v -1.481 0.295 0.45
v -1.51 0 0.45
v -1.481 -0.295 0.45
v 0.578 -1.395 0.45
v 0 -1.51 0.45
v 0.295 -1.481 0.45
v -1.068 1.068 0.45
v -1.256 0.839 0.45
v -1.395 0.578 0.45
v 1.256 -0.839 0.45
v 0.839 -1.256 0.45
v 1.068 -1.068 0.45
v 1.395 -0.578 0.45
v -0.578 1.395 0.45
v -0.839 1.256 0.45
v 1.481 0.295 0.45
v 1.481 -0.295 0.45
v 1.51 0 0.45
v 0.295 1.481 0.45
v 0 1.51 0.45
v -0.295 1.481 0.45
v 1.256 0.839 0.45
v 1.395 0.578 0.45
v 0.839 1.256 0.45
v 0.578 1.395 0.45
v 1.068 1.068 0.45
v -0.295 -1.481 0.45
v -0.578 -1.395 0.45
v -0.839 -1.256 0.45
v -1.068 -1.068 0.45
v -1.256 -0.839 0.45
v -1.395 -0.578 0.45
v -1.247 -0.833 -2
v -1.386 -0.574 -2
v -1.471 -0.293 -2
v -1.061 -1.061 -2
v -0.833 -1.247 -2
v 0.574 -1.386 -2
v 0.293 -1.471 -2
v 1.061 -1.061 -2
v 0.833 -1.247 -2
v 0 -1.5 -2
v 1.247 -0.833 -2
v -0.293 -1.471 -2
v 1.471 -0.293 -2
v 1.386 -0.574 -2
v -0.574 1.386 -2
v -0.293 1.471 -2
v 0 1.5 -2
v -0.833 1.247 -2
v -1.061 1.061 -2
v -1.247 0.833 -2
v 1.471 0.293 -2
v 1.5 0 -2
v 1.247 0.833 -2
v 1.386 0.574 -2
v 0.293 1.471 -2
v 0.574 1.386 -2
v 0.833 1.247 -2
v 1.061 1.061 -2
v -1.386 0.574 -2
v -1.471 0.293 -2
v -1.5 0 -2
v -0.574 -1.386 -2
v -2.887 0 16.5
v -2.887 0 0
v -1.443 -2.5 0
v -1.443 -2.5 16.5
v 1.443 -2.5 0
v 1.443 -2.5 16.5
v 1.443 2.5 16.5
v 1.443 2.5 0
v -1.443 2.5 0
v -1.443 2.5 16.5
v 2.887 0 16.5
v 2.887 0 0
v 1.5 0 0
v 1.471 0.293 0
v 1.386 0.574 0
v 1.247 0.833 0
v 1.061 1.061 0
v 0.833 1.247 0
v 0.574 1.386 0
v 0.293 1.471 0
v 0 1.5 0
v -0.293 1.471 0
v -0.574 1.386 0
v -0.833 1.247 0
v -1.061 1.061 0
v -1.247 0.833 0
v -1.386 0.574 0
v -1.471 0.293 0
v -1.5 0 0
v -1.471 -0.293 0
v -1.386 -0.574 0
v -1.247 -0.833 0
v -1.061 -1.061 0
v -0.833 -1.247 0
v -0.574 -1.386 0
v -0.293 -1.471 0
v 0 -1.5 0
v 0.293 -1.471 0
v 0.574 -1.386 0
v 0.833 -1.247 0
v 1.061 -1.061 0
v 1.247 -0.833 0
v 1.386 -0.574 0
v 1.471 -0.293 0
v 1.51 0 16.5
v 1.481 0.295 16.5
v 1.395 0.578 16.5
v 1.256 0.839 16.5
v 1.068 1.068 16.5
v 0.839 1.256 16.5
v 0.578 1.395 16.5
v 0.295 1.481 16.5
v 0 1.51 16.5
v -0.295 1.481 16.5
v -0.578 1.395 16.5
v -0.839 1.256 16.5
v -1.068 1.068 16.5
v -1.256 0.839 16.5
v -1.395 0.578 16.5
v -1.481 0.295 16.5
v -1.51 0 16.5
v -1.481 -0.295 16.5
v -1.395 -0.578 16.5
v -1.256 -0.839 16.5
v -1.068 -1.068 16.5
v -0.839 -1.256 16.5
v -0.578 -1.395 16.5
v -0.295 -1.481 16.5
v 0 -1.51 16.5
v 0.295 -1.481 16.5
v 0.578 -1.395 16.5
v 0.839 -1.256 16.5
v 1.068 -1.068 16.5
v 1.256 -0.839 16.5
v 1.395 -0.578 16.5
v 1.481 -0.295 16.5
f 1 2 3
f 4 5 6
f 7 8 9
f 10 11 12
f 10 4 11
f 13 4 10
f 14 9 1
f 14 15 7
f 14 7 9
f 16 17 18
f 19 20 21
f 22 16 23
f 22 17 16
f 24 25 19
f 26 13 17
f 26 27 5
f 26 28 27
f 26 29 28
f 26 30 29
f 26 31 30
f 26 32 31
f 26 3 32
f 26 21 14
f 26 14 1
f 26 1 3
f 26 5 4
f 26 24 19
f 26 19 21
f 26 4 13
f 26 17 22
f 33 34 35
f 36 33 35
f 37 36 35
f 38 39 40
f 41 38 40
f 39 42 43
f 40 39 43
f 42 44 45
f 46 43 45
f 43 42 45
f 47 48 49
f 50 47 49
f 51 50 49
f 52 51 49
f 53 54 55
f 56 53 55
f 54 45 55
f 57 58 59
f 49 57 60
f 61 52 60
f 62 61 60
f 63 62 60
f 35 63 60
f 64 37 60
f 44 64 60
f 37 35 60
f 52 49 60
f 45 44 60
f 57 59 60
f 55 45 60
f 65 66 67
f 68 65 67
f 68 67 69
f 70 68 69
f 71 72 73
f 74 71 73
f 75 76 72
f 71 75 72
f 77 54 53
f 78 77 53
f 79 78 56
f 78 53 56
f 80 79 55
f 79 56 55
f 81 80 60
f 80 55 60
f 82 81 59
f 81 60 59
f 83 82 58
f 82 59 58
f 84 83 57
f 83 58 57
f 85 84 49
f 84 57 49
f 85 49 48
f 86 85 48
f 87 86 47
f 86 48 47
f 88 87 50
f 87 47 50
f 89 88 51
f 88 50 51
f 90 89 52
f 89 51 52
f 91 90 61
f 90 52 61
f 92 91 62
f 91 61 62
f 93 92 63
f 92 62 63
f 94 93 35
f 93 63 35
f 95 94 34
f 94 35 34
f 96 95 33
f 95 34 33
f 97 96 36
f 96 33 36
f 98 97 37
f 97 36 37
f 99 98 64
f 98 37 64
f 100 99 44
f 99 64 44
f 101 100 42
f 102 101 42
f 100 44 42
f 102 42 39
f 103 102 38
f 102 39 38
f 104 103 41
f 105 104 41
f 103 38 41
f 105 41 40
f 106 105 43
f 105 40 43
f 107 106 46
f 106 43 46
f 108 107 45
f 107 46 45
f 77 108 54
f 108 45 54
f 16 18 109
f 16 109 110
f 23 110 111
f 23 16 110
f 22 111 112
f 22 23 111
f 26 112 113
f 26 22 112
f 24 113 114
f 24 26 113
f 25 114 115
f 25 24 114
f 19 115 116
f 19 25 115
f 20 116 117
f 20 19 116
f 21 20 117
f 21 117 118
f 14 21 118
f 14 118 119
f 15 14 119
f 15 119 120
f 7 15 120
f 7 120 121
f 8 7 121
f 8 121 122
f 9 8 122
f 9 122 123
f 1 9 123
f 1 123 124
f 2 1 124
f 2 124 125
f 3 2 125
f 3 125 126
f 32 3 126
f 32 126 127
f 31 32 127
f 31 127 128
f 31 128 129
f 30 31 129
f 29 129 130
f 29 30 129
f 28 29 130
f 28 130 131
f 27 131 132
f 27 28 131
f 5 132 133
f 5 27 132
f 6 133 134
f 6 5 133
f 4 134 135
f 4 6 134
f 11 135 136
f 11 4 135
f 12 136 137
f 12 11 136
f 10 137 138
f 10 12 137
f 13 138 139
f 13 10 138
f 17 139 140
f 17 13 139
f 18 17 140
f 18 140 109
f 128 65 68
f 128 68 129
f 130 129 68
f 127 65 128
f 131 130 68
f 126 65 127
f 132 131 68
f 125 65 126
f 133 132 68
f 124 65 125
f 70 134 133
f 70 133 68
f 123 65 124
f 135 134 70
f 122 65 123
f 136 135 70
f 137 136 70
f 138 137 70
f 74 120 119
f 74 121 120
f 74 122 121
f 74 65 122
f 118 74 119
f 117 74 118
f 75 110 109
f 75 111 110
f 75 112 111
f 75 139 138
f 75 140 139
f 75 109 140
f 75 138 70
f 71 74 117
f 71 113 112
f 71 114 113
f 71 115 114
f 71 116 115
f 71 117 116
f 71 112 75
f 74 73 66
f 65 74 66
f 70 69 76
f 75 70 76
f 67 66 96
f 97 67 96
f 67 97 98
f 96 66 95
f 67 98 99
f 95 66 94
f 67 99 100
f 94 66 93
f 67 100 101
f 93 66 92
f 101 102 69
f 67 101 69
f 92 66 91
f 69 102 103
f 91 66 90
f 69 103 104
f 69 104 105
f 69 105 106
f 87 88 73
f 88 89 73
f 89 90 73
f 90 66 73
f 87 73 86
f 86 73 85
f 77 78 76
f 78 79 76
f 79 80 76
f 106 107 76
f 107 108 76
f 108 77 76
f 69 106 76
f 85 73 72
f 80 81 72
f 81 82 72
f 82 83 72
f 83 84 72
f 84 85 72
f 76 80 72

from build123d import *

# Parameters (mm, degrees)
FEMALE_M3_HEX_STANDOFF_AF5_SKETCH_R = 1.51
FEMALE_M3_HEX_STANDOFF_AF5_DEPTH    = 16.5
STUD_ROOT_SKETCH_R                  = 1.85
STUD_ROOT_DEPTH                     = 0.45
MALE_M3_STUD_ENVELOPE_START         = -2
MALE_M3_STUD_ENVELOPE_SKETCH_R      = 1.5
MALE_M3_STUD_ENVELOPE_DEPTH         = 2


with BuildPart() as part:
    # Female_M3_hex_standoff_AF5_Sketch → Female_M3_hex_standoff_AF5 (new body)
    with BuildSketch(Plane.XY):
        Polygon((2.886751346, 0), (1.443375673, 2.5), (-1.443375673, 2.5), (-2.886751346, 0), (-1.443375673, -2.5), (1.443375673, -2.5), align=None)
        Circle(FEMALE_M3_HEX_STANDOFF_AF5_SKETCH_R, mode=Mode.SUBTRACT)
    extrude(amount=FEMALE_M3_HEX_STANDOFF_AF5_DEPTH)

    # Stud_root_Sketch → Stud_root (add)
    with BuildSketch(Plane.XY):
        Circle(STUD_ROOT_SKETCH_R)
    extrude(amount=STUD_ROOT_DEPTH)

    # Male_M3_stud_envelope_Sketch → Male_M3_stud_envelope (add)
    with BuildSketch(Plane.XY.offset(MALE_M3_STUD_ENVELOPE_START)):
        Circle(MALE_M3_STUD_ENVELOPE_SKETCH_R)
    extrude(amount=MALE_M3_STUD_ENVELOPE_DEPTH)


solid = part.part
